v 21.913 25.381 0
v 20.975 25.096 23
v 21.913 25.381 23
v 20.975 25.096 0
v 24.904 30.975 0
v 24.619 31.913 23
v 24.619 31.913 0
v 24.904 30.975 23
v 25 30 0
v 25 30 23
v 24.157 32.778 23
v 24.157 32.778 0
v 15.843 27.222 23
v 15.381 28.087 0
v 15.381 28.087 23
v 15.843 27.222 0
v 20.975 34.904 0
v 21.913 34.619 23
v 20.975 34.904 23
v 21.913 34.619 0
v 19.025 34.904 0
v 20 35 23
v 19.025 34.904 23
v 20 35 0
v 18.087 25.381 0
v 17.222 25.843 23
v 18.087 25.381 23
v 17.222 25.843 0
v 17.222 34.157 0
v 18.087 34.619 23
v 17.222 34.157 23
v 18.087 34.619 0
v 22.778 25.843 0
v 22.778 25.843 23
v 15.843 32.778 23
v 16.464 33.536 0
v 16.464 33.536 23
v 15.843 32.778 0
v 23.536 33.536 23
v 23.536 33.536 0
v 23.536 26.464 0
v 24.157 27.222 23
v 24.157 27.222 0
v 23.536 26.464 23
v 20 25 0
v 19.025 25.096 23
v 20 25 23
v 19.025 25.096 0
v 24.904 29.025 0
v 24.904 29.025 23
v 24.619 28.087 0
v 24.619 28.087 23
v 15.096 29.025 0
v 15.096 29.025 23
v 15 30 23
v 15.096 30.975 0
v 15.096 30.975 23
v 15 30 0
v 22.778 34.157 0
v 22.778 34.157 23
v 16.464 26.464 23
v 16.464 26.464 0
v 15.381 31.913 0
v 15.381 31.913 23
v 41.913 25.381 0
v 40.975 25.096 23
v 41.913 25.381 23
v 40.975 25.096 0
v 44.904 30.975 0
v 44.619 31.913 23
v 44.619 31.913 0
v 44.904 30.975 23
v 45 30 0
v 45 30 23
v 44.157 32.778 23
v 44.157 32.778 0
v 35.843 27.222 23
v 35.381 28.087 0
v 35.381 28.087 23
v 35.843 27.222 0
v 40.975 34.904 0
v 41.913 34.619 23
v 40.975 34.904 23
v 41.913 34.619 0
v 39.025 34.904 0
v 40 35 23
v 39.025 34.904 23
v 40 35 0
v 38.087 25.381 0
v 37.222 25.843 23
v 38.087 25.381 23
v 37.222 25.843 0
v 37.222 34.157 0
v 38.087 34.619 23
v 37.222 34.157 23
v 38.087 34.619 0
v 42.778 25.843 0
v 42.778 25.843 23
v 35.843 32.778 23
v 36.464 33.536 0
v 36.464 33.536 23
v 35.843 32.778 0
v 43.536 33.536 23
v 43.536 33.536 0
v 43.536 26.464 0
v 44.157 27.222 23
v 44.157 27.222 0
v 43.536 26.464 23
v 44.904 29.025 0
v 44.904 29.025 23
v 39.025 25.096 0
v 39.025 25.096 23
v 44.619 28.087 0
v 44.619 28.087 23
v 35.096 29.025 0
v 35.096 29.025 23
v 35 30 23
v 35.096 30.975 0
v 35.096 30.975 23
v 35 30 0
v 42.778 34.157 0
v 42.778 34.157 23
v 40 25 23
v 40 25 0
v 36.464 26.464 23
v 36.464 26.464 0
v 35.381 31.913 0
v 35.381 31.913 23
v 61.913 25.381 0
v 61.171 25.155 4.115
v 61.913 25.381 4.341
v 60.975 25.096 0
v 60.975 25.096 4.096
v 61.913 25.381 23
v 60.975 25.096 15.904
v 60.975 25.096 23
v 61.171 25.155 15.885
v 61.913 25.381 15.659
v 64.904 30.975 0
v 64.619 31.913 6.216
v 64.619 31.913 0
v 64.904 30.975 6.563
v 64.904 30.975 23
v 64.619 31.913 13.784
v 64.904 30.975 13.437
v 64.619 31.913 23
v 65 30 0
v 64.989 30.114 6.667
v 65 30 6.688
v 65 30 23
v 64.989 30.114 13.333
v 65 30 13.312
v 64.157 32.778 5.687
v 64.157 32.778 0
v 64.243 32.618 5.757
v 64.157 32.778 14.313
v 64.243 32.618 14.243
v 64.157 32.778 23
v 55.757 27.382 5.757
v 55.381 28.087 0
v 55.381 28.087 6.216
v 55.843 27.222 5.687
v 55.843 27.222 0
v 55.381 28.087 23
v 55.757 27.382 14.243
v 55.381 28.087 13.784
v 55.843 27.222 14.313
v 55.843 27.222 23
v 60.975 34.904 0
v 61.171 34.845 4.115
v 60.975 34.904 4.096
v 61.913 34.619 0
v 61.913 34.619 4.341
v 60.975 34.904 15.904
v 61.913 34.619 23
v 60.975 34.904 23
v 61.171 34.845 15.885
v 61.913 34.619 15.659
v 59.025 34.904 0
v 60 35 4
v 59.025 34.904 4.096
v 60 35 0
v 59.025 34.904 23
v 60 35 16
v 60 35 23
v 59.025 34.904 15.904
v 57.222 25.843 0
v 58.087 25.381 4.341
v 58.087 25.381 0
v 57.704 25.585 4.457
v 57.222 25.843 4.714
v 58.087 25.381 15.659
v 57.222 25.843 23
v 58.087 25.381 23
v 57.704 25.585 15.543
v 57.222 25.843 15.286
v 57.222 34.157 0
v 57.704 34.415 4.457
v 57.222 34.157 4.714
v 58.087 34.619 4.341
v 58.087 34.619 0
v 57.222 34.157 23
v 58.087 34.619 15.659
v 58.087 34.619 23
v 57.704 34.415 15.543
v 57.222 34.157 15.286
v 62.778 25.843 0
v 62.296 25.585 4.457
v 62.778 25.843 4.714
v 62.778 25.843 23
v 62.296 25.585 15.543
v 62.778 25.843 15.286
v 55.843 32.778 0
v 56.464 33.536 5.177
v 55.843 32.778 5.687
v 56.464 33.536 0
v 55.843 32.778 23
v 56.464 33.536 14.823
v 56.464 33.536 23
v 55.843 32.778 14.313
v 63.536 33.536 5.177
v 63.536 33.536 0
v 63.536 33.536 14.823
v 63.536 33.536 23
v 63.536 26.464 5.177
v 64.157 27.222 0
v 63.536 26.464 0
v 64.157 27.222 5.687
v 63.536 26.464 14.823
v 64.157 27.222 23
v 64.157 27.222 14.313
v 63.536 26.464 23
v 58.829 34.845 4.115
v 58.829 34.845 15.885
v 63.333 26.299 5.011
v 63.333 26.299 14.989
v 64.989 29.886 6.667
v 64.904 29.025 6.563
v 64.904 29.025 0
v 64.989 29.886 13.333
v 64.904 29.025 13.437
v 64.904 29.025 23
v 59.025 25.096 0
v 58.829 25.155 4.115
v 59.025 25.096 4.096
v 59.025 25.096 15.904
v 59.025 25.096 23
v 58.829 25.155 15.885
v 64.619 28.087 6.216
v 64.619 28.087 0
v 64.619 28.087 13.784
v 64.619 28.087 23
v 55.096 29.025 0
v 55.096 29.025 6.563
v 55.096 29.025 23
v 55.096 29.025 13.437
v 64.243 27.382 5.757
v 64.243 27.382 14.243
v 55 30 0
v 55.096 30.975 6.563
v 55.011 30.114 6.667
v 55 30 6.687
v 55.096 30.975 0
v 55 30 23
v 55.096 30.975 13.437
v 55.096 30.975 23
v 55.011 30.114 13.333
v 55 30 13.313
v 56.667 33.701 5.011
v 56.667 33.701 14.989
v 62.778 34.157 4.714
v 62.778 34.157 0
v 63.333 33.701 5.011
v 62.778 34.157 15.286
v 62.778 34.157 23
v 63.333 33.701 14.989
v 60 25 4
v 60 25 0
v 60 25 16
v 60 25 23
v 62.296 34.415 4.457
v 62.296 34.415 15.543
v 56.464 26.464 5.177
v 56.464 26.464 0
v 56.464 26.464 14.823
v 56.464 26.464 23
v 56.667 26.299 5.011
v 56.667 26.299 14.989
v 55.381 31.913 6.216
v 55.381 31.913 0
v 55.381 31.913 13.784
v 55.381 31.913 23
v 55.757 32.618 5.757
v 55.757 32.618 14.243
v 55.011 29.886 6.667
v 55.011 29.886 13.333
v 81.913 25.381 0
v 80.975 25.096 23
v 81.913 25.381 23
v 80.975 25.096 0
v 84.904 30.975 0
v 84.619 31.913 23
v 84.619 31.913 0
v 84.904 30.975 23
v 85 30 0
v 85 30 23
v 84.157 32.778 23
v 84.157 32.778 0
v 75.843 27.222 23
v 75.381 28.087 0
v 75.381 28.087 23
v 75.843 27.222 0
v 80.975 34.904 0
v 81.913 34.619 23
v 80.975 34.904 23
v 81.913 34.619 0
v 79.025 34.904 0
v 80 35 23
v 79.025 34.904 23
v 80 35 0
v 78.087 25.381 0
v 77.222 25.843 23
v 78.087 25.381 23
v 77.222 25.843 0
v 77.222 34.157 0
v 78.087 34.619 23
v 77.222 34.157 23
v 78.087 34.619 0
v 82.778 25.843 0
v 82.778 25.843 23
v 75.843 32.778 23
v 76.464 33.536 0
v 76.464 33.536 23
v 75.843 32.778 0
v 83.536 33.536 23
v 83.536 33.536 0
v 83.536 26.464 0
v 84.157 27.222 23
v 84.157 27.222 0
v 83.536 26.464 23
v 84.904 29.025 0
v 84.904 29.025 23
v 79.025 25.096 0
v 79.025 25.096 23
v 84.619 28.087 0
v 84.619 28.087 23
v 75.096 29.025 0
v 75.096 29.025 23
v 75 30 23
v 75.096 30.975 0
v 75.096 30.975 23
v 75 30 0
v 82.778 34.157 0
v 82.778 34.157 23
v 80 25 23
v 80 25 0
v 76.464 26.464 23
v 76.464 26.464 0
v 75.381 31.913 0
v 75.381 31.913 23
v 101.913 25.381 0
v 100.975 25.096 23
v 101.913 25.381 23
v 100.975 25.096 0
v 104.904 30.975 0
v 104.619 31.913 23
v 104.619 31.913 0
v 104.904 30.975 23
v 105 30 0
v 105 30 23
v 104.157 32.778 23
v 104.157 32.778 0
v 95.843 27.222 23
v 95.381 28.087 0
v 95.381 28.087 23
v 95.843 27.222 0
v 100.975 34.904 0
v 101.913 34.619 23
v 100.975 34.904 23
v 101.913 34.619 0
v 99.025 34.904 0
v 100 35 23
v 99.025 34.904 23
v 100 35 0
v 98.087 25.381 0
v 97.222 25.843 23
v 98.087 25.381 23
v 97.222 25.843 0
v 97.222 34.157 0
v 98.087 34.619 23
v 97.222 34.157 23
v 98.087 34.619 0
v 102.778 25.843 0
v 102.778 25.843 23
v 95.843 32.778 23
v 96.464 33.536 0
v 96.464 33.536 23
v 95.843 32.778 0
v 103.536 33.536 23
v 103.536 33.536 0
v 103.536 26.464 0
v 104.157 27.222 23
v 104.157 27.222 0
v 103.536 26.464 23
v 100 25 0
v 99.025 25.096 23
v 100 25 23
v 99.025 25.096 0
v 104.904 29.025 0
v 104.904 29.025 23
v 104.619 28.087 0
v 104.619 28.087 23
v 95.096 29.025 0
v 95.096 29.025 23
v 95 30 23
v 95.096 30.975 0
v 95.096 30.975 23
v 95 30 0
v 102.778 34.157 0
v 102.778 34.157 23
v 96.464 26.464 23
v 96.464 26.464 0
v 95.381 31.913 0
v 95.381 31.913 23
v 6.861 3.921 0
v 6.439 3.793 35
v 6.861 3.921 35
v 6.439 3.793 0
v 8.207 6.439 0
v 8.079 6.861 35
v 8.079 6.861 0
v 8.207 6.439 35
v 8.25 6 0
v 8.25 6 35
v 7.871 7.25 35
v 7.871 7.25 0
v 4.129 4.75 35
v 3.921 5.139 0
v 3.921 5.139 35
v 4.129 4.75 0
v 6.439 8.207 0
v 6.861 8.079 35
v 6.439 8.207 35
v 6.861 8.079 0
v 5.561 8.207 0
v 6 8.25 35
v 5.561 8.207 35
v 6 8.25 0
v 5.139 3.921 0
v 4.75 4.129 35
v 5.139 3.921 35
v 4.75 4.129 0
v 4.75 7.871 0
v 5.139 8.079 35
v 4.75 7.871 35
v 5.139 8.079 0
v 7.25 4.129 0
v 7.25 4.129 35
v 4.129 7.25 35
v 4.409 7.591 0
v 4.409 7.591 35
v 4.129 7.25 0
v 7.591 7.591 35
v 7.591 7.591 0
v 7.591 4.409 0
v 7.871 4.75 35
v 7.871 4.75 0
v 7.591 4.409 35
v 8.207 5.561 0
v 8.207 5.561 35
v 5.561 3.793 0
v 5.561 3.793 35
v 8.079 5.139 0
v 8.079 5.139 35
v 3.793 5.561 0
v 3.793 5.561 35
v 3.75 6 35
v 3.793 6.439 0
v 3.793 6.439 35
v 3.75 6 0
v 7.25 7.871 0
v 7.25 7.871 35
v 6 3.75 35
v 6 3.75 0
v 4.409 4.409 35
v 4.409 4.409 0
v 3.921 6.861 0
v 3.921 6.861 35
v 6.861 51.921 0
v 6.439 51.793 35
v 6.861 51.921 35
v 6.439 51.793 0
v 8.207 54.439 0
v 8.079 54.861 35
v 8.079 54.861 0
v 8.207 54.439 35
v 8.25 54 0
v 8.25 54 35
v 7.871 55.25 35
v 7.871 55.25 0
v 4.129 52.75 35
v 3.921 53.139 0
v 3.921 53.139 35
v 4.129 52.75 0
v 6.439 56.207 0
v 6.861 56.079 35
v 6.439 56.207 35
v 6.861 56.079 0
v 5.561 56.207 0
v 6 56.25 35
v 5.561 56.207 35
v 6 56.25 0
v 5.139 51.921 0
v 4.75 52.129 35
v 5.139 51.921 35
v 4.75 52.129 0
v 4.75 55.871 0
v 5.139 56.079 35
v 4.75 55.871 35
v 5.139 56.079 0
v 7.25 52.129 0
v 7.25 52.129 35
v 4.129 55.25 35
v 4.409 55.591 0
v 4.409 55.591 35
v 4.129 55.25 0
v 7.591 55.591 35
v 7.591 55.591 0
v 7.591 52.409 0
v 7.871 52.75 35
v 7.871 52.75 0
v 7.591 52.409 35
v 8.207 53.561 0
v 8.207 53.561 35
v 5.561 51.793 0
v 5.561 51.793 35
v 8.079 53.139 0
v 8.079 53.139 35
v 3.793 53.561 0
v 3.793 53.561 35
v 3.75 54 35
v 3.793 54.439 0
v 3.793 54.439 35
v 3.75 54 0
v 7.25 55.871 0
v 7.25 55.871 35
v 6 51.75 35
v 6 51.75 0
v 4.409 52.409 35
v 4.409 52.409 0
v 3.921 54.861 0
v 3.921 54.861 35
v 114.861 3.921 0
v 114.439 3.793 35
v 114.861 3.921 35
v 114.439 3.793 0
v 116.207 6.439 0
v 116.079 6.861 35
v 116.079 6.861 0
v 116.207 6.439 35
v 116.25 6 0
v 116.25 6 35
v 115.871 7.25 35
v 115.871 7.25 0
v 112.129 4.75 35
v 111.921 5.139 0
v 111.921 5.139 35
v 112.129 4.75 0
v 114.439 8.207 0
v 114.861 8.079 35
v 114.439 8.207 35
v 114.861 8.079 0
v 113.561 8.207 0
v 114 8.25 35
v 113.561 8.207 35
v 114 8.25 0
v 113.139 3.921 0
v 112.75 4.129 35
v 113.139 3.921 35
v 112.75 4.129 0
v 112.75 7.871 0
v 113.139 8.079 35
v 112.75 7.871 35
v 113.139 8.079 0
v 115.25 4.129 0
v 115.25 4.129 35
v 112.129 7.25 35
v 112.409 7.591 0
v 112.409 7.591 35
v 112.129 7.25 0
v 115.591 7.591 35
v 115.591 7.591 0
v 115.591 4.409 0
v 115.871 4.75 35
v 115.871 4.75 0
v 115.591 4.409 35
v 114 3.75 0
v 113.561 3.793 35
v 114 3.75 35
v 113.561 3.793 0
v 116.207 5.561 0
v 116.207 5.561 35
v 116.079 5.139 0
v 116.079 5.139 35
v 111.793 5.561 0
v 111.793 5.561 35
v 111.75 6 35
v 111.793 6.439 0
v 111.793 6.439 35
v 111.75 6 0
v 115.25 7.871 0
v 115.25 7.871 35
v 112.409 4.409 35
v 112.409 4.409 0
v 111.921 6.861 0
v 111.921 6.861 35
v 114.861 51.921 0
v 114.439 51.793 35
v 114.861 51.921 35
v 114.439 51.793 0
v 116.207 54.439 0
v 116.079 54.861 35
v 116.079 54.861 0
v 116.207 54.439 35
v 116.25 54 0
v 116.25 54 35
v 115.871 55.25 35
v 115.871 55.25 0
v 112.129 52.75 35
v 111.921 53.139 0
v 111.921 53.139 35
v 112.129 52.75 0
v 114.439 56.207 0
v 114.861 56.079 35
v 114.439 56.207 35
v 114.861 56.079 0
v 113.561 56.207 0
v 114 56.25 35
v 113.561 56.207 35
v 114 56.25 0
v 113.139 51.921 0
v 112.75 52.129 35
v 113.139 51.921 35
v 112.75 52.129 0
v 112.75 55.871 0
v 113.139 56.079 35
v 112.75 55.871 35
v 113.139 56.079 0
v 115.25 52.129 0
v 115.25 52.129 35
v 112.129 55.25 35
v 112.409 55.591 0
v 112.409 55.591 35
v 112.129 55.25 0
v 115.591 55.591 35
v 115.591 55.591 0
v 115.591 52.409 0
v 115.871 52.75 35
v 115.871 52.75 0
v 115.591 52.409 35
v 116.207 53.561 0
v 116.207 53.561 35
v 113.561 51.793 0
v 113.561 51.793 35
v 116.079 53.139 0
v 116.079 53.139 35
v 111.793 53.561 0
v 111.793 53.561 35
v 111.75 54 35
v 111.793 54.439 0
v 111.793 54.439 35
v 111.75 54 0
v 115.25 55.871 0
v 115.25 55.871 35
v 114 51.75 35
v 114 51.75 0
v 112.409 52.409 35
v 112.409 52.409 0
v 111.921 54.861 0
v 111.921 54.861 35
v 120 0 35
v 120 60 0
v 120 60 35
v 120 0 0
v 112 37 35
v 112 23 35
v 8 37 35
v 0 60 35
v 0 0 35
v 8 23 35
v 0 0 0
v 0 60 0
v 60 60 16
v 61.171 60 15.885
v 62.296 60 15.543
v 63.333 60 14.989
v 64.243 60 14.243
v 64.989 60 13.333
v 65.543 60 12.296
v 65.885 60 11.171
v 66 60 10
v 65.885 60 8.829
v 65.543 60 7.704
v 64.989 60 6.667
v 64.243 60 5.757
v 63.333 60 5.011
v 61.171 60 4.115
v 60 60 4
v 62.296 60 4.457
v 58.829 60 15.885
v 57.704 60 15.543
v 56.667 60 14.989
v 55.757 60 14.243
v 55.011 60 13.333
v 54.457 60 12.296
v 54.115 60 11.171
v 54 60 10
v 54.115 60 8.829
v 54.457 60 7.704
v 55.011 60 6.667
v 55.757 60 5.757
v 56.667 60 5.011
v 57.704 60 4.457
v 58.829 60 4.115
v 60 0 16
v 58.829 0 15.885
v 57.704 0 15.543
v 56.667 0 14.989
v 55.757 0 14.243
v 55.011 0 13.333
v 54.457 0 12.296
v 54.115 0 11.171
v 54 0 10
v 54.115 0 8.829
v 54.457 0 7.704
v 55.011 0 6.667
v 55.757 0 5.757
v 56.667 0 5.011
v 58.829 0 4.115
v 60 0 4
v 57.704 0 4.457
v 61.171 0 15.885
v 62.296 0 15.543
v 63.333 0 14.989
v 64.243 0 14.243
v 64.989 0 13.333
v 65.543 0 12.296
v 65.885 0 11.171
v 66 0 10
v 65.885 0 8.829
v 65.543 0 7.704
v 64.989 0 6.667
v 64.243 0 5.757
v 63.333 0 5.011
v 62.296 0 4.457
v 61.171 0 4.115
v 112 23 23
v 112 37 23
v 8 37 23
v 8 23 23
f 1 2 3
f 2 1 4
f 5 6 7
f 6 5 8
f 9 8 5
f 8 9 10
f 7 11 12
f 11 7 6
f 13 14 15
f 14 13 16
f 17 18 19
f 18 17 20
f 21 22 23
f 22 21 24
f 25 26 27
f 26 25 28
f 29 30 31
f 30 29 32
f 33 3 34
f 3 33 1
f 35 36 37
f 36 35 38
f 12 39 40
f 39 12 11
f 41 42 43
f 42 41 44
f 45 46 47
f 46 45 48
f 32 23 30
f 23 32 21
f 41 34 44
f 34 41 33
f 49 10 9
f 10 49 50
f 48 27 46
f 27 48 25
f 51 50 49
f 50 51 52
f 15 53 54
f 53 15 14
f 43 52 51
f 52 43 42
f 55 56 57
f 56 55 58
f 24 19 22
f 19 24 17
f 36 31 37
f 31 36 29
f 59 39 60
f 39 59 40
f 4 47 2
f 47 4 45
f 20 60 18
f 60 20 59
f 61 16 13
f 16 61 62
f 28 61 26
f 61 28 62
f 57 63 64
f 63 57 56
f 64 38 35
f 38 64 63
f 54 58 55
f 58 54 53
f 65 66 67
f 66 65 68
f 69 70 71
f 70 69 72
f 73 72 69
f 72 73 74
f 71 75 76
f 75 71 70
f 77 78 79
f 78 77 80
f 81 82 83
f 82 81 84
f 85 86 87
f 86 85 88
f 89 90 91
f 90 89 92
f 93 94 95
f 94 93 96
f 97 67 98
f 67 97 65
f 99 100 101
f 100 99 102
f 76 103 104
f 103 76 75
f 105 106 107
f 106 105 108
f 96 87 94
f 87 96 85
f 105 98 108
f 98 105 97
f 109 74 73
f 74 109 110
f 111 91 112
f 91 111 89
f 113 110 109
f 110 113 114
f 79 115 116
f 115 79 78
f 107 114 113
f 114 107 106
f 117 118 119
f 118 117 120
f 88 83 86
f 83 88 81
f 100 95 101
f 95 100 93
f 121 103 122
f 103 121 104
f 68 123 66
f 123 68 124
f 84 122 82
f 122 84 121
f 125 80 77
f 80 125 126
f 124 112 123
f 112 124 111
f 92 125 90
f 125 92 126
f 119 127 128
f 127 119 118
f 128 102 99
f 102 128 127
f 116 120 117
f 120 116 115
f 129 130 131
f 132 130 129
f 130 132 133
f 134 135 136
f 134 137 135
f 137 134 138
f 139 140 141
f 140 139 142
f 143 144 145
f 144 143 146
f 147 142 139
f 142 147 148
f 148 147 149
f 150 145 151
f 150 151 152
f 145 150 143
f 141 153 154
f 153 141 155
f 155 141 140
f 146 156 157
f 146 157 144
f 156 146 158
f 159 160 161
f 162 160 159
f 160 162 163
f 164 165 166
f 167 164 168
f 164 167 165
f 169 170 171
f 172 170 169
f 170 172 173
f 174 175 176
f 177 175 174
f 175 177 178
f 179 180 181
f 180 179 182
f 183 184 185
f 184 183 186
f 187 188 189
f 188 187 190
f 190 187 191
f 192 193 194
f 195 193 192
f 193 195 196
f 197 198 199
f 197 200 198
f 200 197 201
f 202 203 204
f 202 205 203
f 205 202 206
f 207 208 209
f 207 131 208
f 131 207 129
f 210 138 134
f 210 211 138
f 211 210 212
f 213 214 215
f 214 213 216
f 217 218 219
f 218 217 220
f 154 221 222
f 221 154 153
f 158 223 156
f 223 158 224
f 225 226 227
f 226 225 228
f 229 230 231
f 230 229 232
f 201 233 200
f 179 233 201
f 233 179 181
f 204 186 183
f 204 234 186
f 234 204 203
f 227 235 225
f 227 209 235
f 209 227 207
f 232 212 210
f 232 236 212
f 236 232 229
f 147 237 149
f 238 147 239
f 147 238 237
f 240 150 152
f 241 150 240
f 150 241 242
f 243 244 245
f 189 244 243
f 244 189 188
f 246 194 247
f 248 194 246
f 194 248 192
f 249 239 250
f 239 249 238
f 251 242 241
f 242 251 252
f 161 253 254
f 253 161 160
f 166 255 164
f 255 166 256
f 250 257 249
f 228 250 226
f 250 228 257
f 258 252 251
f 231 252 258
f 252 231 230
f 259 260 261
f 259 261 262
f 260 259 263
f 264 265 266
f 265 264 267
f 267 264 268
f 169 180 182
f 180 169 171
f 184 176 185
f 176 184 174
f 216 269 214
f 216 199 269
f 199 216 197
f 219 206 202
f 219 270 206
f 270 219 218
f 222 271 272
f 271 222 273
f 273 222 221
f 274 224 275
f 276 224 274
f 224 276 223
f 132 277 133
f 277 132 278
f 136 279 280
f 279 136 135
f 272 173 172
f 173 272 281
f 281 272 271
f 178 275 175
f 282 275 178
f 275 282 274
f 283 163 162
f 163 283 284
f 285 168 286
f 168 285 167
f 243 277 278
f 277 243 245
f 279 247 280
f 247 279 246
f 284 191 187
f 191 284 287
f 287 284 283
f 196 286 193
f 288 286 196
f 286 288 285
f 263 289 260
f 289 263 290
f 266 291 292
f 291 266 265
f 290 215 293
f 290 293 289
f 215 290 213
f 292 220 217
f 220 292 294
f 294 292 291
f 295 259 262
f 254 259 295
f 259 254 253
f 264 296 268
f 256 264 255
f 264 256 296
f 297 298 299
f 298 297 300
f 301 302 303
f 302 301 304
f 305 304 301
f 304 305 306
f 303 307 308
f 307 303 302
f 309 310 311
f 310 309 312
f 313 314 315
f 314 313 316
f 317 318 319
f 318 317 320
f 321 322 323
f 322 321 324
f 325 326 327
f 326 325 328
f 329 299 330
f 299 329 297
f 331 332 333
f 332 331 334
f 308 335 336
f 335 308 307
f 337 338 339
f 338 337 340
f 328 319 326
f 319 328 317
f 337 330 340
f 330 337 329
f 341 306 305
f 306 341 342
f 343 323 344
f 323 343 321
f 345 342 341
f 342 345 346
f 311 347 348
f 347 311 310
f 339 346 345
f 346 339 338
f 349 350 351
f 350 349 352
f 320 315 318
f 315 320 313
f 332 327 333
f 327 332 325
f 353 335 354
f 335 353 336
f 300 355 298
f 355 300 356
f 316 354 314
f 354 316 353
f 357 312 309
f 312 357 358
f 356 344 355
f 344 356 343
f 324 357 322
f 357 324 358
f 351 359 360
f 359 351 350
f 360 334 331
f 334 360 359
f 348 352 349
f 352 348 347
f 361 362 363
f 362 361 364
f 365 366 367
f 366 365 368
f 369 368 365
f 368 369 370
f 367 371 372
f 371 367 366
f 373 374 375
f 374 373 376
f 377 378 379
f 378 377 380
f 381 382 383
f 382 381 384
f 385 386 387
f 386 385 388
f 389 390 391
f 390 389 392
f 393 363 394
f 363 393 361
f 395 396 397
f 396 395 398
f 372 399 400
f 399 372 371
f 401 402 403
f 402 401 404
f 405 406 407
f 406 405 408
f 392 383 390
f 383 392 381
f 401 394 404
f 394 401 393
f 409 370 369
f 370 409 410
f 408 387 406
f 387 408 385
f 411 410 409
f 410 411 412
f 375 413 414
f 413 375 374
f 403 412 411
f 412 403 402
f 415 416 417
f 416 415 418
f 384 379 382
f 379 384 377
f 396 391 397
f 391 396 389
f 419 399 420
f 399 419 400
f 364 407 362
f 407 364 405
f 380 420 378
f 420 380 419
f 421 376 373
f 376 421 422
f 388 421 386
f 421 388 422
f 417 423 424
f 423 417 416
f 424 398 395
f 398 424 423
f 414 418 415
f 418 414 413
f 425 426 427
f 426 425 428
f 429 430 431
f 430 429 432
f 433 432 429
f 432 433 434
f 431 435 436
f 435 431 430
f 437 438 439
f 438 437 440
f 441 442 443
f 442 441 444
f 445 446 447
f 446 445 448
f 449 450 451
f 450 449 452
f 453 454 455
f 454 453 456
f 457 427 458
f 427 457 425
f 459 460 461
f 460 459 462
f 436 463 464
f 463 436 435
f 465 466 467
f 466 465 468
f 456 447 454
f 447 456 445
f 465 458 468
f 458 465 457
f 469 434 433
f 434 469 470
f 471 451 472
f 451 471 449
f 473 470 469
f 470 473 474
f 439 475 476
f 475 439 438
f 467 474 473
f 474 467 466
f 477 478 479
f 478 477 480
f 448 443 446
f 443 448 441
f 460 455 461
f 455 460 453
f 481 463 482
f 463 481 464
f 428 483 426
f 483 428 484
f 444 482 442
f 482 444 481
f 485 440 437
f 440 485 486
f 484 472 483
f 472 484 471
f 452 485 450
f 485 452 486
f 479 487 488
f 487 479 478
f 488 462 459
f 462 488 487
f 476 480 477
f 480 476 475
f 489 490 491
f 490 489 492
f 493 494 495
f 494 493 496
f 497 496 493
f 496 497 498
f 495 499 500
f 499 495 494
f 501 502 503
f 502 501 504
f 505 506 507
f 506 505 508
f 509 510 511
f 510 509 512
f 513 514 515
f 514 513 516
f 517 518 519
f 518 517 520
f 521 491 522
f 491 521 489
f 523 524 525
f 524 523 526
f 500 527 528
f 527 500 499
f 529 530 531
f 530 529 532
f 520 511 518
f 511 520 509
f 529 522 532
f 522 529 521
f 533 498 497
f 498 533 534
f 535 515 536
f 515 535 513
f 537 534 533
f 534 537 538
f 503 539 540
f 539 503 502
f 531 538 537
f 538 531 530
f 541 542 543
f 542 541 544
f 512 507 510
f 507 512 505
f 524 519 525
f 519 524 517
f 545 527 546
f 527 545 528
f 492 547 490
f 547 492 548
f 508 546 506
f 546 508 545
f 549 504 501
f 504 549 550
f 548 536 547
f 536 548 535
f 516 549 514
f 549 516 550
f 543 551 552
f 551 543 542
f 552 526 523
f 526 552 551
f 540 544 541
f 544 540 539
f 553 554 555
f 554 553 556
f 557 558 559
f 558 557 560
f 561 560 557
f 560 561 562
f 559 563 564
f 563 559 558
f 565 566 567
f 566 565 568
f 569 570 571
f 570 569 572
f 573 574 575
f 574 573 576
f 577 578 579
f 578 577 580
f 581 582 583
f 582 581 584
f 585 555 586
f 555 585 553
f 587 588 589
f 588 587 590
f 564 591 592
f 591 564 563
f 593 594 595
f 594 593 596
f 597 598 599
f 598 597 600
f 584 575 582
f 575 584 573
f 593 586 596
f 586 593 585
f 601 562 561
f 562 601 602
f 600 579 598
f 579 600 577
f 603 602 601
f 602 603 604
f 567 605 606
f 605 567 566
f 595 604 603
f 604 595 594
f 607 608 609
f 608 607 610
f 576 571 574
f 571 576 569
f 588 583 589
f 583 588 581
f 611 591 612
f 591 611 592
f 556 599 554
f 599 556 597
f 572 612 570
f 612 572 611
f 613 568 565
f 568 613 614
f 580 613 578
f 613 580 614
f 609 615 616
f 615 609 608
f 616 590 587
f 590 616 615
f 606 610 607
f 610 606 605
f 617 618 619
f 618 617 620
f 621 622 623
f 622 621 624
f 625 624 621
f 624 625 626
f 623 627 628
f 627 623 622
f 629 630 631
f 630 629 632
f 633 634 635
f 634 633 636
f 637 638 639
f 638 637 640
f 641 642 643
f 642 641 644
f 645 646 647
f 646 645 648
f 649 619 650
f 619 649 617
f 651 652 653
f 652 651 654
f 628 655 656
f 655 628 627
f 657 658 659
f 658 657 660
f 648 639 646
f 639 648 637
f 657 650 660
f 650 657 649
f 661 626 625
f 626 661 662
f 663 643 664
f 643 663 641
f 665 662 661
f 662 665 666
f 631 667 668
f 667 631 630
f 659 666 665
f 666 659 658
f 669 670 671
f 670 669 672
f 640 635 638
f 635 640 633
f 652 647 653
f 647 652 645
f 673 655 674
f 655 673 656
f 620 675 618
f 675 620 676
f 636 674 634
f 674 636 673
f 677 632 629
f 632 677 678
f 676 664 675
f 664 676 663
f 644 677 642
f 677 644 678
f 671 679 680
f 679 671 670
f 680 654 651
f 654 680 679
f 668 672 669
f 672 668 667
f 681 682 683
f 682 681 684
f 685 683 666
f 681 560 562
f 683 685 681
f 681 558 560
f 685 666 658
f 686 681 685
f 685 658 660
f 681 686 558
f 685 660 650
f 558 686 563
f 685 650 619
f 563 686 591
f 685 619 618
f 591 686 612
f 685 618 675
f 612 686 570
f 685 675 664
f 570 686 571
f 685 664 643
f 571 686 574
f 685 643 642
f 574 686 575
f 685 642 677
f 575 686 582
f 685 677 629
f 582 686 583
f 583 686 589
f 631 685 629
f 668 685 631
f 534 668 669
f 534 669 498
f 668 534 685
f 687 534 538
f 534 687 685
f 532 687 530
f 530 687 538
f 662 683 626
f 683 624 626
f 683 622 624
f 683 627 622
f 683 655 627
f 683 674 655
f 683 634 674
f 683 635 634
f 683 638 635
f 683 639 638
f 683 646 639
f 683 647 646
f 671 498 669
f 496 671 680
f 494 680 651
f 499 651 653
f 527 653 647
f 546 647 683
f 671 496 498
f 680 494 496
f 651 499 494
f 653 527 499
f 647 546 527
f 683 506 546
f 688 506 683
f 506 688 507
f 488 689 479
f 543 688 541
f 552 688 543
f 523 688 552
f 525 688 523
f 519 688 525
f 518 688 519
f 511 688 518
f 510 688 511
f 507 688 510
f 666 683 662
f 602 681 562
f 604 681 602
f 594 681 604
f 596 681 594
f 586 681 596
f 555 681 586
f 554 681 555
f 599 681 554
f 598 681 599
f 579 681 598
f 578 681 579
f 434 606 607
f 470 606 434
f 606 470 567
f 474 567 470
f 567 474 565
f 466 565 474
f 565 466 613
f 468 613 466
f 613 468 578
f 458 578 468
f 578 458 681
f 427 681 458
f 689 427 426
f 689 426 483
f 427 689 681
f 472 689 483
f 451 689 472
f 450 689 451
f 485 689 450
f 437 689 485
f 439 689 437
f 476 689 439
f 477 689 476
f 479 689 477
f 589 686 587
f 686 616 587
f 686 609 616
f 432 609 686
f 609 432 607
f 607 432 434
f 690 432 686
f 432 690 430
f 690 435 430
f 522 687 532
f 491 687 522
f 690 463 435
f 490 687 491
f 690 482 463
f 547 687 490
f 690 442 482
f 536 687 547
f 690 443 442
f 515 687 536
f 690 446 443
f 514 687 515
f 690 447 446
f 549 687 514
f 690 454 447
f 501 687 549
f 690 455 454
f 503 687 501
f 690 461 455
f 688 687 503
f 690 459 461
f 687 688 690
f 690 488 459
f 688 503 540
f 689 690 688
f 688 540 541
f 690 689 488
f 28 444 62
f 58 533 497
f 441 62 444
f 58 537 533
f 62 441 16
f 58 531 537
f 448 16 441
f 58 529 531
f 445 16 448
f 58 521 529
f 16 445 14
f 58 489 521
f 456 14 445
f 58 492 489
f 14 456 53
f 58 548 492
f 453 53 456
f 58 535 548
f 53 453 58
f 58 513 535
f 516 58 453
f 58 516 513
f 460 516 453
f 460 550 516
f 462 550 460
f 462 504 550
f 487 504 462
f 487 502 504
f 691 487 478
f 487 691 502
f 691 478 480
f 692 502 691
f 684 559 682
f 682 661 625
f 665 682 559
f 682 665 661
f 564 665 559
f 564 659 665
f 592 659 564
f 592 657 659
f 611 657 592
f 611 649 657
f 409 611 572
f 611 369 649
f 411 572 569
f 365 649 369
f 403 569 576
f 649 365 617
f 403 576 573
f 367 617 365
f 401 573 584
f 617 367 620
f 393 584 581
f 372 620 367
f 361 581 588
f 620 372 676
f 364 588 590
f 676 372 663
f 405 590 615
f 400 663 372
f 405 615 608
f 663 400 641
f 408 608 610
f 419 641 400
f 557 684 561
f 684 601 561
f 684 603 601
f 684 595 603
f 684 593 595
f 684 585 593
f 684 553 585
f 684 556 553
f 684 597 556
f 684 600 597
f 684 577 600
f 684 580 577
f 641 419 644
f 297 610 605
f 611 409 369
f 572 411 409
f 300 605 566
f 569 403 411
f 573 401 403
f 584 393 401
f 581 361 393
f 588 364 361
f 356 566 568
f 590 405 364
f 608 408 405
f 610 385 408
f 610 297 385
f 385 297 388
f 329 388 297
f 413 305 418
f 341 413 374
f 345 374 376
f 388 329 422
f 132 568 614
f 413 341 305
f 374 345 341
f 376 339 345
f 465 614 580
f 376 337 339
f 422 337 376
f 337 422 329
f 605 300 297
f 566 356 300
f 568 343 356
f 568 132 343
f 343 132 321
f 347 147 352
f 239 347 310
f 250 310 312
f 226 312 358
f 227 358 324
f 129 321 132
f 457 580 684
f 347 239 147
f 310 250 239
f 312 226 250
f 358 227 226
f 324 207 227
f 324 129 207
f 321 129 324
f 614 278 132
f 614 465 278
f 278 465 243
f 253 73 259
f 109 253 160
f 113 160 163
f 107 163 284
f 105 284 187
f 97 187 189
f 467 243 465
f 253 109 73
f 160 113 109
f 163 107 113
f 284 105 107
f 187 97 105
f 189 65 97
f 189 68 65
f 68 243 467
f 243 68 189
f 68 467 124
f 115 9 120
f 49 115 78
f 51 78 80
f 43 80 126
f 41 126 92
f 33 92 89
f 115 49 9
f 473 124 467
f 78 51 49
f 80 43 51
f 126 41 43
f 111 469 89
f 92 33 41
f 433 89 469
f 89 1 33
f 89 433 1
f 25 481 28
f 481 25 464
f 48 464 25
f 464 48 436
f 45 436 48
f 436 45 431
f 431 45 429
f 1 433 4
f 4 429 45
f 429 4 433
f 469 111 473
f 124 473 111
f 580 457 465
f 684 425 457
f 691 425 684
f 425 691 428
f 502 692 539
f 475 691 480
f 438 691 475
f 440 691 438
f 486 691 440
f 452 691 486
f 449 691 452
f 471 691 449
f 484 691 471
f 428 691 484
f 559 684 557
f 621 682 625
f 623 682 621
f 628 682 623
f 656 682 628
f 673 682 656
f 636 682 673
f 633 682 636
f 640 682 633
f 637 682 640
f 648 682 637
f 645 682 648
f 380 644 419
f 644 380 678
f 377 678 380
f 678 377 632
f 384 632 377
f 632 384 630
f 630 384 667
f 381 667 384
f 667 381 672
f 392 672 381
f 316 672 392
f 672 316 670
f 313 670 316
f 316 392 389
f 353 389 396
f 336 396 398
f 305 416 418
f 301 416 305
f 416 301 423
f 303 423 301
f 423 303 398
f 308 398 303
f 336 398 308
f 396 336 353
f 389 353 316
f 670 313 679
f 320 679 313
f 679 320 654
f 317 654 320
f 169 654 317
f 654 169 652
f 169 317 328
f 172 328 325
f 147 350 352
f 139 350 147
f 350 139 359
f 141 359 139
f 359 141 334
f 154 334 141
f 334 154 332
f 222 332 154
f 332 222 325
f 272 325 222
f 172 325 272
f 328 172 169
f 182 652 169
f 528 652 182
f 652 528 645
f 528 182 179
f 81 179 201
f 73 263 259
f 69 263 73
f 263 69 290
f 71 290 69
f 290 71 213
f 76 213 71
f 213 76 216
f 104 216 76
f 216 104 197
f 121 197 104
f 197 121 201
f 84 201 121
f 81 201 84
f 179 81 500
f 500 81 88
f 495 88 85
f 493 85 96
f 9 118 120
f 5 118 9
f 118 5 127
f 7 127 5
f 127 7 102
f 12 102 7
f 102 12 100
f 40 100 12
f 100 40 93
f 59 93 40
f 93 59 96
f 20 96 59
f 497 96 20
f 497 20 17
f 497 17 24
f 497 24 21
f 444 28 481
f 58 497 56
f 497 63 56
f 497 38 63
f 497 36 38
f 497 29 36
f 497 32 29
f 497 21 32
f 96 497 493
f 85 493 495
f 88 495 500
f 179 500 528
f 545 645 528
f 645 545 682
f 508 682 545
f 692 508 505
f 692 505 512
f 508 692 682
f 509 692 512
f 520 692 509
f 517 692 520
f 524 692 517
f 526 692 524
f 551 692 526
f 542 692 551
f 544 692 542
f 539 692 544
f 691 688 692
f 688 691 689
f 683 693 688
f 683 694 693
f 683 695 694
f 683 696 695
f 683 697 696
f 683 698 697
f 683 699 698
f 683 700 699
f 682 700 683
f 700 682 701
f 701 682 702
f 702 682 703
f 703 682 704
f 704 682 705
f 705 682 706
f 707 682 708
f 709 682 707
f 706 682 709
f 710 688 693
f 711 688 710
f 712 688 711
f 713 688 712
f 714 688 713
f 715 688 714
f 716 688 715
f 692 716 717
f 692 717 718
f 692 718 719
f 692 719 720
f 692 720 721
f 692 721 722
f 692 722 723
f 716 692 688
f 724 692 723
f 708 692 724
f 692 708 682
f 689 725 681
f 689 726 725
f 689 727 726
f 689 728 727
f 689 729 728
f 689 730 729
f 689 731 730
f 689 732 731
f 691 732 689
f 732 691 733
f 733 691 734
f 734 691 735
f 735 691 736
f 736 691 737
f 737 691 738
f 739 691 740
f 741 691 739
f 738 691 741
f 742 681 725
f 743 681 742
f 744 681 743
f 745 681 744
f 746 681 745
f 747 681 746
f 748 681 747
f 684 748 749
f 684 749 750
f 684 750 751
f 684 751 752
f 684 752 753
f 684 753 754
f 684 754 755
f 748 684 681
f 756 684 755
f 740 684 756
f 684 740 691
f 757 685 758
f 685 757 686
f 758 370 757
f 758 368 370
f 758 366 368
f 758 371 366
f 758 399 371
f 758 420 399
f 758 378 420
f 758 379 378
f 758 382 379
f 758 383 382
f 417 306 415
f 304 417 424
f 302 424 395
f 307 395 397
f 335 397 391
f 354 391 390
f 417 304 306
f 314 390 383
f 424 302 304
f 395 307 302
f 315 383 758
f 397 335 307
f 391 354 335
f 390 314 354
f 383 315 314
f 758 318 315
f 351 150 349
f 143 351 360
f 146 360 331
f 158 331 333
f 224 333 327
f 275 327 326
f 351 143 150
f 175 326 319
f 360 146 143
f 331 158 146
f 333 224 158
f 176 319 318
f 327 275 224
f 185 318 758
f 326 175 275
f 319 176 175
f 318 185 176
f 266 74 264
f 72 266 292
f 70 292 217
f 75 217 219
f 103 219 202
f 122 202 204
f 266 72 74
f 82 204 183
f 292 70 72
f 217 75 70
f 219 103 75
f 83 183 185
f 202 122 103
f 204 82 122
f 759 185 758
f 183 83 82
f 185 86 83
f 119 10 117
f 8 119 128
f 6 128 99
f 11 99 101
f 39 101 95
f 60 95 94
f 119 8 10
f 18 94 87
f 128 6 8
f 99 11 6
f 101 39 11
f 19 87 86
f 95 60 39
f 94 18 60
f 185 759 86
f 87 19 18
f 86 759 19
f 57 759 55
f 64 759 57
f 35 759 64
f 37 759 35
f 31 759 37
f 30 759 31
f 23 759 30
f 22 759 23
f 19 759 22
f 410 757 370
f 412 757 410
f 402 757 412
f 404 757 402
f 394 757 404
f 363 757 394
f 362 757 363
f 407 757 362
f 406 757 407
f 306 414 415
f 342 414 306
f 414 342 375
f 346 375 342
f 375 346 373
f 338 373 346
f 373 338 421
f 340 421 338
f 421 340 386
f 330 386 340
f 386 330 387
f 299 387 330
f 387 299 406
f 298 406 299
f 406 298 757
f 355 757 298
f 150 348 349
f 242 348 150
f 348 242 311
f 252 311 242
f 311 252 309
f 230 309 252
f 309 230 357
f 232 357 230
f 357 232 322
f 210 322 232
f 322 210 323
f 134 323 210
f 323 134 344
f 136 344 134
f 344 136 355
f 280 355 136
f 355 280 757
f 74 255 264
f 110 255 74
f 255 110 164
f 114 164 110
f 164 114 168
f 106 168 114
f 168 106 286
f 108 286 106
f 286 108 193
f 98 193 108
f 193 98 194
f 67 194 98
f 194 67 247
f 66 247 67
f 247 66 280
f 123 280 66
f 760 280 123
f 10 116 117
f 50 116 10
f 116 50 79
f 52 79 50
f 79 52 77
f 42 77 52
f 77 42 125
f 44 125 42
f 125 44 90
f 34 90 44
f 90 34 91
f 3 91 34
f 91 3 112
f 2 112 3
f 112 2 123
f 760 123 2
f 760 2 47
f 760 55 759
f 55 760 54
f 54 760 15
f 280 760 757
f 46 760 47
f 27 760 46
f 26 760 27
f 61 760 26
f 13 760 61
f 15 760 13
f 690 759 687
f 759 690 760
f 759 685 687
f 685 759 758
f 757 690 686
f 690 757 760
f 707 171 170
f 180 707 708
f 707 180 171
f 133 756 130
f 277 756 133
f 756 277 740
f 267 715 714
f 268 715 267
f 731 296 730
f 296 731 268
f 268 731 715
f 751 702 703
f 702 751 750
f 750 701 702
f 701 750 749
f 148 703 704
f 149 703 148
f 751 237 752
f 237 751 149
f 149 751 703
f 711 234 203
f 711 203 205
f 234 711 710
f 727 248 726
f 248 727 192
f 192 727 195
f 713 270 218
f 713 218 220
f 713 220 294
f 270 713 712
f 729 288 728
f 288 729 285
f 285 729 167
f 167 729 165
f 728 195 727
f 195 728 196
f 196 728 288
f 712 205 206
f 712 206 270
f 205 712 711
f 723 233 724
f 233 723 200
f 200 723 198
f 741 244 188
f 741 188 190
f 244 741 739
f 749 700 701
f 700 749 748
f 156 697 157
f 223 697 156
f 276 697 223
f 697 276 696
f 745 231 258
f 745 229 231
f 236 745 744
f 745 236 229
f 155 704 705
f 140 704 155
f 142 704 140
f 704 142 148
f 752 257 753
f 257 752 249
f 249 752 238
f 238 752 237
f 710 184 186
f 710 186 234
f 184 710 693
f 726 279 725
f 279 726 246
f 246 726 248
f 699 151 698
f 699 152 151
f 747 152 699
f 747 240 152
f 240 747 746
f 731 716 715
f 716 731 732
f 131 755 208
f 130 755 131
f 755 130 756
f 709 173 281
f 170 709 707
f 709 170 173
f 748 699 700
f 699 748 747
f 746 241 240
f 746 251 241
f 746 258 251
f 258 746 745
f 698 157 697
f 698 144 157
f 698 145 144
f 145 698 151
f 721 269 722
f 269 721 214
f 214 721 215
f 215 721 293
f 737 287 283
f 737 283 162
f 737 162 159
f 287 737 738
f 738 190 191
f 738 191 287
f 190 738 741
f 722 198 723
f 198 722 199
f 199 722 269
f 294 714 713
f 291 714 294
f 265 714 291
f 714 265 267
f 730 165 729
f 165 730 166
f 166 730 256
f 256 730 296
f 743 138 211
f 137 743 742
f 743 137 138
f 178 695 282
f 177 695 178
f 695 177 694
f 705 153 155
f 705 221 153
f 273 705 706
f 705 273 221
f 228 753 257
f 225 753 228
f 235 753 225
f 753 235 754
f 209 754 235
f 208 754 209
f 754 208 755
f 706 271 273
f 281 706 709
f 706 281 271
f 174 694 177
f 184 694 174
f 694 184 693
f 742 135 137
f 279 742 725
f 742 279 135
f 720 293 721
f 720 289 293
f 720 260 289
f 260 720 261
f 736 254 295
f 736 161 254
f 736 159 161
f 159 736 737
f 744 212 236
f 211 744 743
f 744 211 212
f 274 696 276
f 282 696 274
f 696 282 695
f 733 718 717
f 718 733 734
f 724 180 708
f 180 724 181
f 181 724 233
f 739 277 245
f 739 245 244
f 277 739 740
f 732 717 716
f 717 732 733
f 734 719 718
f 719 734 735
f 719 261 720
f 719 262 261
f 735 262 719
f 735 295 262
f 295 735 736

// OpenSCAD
$fn = 32;

// ----------------------------------------------------------------------
// Manifold block: side_outlet manifold
// ----------------------------------------------------------------------

// --- parameters (mm) ---
block_l = 120;            // block length, X
block_w = 60;             // block width, Y
block_h = 35;             // block height, Z
port_d = 10;              // port bore diameter
port_pitch = 20;          // port pitch along X
gallery_d = 14;           // top gallery width, Y
gallery_depth = 12;       // gallery pocket depth
wall_p = 8;               // gallery end wall thickness, X
mnt_d = 4.5;              // mounting hole diameter
mnt_in = 6;               // mounting hole inset from the edges
out_d = 12;               // outlet bore diameter
out_z = 10;               // outlet axis height

n_ports = 5;  // ports in the row
port_x0 = (block_l - (n_ports - 1) * port_pitch) / 2;  // first port X

difference() {
  cube([block_l, block_w, block_h]);
  for (i = [0 : n_ports - 1])
    translate([port_x0 + i * port_pitch, block_w / 2, -1])
      cylinder(h = block_h + 2, d = port_d);
  translate([wall_p, block_w / 2 - gallery_d / 2, block_h - gallery_depth])
    cube([block_l - 2 * wall_p, gallery_d, gallery_depth + 1]);
  for (cx = [mnt_in, block_l - mnt_in])
    for (cy = [mnt_in, block_w - mnt_in])
      translate([cx, cy, -1]) cylinder(h = block_h + 2, d = mnt_d);
  translate([block_l / 2, -1, out_z]) rotate([-90, 0, 0])
    cylinder(h = block_w + 2, d = out_d);
}
